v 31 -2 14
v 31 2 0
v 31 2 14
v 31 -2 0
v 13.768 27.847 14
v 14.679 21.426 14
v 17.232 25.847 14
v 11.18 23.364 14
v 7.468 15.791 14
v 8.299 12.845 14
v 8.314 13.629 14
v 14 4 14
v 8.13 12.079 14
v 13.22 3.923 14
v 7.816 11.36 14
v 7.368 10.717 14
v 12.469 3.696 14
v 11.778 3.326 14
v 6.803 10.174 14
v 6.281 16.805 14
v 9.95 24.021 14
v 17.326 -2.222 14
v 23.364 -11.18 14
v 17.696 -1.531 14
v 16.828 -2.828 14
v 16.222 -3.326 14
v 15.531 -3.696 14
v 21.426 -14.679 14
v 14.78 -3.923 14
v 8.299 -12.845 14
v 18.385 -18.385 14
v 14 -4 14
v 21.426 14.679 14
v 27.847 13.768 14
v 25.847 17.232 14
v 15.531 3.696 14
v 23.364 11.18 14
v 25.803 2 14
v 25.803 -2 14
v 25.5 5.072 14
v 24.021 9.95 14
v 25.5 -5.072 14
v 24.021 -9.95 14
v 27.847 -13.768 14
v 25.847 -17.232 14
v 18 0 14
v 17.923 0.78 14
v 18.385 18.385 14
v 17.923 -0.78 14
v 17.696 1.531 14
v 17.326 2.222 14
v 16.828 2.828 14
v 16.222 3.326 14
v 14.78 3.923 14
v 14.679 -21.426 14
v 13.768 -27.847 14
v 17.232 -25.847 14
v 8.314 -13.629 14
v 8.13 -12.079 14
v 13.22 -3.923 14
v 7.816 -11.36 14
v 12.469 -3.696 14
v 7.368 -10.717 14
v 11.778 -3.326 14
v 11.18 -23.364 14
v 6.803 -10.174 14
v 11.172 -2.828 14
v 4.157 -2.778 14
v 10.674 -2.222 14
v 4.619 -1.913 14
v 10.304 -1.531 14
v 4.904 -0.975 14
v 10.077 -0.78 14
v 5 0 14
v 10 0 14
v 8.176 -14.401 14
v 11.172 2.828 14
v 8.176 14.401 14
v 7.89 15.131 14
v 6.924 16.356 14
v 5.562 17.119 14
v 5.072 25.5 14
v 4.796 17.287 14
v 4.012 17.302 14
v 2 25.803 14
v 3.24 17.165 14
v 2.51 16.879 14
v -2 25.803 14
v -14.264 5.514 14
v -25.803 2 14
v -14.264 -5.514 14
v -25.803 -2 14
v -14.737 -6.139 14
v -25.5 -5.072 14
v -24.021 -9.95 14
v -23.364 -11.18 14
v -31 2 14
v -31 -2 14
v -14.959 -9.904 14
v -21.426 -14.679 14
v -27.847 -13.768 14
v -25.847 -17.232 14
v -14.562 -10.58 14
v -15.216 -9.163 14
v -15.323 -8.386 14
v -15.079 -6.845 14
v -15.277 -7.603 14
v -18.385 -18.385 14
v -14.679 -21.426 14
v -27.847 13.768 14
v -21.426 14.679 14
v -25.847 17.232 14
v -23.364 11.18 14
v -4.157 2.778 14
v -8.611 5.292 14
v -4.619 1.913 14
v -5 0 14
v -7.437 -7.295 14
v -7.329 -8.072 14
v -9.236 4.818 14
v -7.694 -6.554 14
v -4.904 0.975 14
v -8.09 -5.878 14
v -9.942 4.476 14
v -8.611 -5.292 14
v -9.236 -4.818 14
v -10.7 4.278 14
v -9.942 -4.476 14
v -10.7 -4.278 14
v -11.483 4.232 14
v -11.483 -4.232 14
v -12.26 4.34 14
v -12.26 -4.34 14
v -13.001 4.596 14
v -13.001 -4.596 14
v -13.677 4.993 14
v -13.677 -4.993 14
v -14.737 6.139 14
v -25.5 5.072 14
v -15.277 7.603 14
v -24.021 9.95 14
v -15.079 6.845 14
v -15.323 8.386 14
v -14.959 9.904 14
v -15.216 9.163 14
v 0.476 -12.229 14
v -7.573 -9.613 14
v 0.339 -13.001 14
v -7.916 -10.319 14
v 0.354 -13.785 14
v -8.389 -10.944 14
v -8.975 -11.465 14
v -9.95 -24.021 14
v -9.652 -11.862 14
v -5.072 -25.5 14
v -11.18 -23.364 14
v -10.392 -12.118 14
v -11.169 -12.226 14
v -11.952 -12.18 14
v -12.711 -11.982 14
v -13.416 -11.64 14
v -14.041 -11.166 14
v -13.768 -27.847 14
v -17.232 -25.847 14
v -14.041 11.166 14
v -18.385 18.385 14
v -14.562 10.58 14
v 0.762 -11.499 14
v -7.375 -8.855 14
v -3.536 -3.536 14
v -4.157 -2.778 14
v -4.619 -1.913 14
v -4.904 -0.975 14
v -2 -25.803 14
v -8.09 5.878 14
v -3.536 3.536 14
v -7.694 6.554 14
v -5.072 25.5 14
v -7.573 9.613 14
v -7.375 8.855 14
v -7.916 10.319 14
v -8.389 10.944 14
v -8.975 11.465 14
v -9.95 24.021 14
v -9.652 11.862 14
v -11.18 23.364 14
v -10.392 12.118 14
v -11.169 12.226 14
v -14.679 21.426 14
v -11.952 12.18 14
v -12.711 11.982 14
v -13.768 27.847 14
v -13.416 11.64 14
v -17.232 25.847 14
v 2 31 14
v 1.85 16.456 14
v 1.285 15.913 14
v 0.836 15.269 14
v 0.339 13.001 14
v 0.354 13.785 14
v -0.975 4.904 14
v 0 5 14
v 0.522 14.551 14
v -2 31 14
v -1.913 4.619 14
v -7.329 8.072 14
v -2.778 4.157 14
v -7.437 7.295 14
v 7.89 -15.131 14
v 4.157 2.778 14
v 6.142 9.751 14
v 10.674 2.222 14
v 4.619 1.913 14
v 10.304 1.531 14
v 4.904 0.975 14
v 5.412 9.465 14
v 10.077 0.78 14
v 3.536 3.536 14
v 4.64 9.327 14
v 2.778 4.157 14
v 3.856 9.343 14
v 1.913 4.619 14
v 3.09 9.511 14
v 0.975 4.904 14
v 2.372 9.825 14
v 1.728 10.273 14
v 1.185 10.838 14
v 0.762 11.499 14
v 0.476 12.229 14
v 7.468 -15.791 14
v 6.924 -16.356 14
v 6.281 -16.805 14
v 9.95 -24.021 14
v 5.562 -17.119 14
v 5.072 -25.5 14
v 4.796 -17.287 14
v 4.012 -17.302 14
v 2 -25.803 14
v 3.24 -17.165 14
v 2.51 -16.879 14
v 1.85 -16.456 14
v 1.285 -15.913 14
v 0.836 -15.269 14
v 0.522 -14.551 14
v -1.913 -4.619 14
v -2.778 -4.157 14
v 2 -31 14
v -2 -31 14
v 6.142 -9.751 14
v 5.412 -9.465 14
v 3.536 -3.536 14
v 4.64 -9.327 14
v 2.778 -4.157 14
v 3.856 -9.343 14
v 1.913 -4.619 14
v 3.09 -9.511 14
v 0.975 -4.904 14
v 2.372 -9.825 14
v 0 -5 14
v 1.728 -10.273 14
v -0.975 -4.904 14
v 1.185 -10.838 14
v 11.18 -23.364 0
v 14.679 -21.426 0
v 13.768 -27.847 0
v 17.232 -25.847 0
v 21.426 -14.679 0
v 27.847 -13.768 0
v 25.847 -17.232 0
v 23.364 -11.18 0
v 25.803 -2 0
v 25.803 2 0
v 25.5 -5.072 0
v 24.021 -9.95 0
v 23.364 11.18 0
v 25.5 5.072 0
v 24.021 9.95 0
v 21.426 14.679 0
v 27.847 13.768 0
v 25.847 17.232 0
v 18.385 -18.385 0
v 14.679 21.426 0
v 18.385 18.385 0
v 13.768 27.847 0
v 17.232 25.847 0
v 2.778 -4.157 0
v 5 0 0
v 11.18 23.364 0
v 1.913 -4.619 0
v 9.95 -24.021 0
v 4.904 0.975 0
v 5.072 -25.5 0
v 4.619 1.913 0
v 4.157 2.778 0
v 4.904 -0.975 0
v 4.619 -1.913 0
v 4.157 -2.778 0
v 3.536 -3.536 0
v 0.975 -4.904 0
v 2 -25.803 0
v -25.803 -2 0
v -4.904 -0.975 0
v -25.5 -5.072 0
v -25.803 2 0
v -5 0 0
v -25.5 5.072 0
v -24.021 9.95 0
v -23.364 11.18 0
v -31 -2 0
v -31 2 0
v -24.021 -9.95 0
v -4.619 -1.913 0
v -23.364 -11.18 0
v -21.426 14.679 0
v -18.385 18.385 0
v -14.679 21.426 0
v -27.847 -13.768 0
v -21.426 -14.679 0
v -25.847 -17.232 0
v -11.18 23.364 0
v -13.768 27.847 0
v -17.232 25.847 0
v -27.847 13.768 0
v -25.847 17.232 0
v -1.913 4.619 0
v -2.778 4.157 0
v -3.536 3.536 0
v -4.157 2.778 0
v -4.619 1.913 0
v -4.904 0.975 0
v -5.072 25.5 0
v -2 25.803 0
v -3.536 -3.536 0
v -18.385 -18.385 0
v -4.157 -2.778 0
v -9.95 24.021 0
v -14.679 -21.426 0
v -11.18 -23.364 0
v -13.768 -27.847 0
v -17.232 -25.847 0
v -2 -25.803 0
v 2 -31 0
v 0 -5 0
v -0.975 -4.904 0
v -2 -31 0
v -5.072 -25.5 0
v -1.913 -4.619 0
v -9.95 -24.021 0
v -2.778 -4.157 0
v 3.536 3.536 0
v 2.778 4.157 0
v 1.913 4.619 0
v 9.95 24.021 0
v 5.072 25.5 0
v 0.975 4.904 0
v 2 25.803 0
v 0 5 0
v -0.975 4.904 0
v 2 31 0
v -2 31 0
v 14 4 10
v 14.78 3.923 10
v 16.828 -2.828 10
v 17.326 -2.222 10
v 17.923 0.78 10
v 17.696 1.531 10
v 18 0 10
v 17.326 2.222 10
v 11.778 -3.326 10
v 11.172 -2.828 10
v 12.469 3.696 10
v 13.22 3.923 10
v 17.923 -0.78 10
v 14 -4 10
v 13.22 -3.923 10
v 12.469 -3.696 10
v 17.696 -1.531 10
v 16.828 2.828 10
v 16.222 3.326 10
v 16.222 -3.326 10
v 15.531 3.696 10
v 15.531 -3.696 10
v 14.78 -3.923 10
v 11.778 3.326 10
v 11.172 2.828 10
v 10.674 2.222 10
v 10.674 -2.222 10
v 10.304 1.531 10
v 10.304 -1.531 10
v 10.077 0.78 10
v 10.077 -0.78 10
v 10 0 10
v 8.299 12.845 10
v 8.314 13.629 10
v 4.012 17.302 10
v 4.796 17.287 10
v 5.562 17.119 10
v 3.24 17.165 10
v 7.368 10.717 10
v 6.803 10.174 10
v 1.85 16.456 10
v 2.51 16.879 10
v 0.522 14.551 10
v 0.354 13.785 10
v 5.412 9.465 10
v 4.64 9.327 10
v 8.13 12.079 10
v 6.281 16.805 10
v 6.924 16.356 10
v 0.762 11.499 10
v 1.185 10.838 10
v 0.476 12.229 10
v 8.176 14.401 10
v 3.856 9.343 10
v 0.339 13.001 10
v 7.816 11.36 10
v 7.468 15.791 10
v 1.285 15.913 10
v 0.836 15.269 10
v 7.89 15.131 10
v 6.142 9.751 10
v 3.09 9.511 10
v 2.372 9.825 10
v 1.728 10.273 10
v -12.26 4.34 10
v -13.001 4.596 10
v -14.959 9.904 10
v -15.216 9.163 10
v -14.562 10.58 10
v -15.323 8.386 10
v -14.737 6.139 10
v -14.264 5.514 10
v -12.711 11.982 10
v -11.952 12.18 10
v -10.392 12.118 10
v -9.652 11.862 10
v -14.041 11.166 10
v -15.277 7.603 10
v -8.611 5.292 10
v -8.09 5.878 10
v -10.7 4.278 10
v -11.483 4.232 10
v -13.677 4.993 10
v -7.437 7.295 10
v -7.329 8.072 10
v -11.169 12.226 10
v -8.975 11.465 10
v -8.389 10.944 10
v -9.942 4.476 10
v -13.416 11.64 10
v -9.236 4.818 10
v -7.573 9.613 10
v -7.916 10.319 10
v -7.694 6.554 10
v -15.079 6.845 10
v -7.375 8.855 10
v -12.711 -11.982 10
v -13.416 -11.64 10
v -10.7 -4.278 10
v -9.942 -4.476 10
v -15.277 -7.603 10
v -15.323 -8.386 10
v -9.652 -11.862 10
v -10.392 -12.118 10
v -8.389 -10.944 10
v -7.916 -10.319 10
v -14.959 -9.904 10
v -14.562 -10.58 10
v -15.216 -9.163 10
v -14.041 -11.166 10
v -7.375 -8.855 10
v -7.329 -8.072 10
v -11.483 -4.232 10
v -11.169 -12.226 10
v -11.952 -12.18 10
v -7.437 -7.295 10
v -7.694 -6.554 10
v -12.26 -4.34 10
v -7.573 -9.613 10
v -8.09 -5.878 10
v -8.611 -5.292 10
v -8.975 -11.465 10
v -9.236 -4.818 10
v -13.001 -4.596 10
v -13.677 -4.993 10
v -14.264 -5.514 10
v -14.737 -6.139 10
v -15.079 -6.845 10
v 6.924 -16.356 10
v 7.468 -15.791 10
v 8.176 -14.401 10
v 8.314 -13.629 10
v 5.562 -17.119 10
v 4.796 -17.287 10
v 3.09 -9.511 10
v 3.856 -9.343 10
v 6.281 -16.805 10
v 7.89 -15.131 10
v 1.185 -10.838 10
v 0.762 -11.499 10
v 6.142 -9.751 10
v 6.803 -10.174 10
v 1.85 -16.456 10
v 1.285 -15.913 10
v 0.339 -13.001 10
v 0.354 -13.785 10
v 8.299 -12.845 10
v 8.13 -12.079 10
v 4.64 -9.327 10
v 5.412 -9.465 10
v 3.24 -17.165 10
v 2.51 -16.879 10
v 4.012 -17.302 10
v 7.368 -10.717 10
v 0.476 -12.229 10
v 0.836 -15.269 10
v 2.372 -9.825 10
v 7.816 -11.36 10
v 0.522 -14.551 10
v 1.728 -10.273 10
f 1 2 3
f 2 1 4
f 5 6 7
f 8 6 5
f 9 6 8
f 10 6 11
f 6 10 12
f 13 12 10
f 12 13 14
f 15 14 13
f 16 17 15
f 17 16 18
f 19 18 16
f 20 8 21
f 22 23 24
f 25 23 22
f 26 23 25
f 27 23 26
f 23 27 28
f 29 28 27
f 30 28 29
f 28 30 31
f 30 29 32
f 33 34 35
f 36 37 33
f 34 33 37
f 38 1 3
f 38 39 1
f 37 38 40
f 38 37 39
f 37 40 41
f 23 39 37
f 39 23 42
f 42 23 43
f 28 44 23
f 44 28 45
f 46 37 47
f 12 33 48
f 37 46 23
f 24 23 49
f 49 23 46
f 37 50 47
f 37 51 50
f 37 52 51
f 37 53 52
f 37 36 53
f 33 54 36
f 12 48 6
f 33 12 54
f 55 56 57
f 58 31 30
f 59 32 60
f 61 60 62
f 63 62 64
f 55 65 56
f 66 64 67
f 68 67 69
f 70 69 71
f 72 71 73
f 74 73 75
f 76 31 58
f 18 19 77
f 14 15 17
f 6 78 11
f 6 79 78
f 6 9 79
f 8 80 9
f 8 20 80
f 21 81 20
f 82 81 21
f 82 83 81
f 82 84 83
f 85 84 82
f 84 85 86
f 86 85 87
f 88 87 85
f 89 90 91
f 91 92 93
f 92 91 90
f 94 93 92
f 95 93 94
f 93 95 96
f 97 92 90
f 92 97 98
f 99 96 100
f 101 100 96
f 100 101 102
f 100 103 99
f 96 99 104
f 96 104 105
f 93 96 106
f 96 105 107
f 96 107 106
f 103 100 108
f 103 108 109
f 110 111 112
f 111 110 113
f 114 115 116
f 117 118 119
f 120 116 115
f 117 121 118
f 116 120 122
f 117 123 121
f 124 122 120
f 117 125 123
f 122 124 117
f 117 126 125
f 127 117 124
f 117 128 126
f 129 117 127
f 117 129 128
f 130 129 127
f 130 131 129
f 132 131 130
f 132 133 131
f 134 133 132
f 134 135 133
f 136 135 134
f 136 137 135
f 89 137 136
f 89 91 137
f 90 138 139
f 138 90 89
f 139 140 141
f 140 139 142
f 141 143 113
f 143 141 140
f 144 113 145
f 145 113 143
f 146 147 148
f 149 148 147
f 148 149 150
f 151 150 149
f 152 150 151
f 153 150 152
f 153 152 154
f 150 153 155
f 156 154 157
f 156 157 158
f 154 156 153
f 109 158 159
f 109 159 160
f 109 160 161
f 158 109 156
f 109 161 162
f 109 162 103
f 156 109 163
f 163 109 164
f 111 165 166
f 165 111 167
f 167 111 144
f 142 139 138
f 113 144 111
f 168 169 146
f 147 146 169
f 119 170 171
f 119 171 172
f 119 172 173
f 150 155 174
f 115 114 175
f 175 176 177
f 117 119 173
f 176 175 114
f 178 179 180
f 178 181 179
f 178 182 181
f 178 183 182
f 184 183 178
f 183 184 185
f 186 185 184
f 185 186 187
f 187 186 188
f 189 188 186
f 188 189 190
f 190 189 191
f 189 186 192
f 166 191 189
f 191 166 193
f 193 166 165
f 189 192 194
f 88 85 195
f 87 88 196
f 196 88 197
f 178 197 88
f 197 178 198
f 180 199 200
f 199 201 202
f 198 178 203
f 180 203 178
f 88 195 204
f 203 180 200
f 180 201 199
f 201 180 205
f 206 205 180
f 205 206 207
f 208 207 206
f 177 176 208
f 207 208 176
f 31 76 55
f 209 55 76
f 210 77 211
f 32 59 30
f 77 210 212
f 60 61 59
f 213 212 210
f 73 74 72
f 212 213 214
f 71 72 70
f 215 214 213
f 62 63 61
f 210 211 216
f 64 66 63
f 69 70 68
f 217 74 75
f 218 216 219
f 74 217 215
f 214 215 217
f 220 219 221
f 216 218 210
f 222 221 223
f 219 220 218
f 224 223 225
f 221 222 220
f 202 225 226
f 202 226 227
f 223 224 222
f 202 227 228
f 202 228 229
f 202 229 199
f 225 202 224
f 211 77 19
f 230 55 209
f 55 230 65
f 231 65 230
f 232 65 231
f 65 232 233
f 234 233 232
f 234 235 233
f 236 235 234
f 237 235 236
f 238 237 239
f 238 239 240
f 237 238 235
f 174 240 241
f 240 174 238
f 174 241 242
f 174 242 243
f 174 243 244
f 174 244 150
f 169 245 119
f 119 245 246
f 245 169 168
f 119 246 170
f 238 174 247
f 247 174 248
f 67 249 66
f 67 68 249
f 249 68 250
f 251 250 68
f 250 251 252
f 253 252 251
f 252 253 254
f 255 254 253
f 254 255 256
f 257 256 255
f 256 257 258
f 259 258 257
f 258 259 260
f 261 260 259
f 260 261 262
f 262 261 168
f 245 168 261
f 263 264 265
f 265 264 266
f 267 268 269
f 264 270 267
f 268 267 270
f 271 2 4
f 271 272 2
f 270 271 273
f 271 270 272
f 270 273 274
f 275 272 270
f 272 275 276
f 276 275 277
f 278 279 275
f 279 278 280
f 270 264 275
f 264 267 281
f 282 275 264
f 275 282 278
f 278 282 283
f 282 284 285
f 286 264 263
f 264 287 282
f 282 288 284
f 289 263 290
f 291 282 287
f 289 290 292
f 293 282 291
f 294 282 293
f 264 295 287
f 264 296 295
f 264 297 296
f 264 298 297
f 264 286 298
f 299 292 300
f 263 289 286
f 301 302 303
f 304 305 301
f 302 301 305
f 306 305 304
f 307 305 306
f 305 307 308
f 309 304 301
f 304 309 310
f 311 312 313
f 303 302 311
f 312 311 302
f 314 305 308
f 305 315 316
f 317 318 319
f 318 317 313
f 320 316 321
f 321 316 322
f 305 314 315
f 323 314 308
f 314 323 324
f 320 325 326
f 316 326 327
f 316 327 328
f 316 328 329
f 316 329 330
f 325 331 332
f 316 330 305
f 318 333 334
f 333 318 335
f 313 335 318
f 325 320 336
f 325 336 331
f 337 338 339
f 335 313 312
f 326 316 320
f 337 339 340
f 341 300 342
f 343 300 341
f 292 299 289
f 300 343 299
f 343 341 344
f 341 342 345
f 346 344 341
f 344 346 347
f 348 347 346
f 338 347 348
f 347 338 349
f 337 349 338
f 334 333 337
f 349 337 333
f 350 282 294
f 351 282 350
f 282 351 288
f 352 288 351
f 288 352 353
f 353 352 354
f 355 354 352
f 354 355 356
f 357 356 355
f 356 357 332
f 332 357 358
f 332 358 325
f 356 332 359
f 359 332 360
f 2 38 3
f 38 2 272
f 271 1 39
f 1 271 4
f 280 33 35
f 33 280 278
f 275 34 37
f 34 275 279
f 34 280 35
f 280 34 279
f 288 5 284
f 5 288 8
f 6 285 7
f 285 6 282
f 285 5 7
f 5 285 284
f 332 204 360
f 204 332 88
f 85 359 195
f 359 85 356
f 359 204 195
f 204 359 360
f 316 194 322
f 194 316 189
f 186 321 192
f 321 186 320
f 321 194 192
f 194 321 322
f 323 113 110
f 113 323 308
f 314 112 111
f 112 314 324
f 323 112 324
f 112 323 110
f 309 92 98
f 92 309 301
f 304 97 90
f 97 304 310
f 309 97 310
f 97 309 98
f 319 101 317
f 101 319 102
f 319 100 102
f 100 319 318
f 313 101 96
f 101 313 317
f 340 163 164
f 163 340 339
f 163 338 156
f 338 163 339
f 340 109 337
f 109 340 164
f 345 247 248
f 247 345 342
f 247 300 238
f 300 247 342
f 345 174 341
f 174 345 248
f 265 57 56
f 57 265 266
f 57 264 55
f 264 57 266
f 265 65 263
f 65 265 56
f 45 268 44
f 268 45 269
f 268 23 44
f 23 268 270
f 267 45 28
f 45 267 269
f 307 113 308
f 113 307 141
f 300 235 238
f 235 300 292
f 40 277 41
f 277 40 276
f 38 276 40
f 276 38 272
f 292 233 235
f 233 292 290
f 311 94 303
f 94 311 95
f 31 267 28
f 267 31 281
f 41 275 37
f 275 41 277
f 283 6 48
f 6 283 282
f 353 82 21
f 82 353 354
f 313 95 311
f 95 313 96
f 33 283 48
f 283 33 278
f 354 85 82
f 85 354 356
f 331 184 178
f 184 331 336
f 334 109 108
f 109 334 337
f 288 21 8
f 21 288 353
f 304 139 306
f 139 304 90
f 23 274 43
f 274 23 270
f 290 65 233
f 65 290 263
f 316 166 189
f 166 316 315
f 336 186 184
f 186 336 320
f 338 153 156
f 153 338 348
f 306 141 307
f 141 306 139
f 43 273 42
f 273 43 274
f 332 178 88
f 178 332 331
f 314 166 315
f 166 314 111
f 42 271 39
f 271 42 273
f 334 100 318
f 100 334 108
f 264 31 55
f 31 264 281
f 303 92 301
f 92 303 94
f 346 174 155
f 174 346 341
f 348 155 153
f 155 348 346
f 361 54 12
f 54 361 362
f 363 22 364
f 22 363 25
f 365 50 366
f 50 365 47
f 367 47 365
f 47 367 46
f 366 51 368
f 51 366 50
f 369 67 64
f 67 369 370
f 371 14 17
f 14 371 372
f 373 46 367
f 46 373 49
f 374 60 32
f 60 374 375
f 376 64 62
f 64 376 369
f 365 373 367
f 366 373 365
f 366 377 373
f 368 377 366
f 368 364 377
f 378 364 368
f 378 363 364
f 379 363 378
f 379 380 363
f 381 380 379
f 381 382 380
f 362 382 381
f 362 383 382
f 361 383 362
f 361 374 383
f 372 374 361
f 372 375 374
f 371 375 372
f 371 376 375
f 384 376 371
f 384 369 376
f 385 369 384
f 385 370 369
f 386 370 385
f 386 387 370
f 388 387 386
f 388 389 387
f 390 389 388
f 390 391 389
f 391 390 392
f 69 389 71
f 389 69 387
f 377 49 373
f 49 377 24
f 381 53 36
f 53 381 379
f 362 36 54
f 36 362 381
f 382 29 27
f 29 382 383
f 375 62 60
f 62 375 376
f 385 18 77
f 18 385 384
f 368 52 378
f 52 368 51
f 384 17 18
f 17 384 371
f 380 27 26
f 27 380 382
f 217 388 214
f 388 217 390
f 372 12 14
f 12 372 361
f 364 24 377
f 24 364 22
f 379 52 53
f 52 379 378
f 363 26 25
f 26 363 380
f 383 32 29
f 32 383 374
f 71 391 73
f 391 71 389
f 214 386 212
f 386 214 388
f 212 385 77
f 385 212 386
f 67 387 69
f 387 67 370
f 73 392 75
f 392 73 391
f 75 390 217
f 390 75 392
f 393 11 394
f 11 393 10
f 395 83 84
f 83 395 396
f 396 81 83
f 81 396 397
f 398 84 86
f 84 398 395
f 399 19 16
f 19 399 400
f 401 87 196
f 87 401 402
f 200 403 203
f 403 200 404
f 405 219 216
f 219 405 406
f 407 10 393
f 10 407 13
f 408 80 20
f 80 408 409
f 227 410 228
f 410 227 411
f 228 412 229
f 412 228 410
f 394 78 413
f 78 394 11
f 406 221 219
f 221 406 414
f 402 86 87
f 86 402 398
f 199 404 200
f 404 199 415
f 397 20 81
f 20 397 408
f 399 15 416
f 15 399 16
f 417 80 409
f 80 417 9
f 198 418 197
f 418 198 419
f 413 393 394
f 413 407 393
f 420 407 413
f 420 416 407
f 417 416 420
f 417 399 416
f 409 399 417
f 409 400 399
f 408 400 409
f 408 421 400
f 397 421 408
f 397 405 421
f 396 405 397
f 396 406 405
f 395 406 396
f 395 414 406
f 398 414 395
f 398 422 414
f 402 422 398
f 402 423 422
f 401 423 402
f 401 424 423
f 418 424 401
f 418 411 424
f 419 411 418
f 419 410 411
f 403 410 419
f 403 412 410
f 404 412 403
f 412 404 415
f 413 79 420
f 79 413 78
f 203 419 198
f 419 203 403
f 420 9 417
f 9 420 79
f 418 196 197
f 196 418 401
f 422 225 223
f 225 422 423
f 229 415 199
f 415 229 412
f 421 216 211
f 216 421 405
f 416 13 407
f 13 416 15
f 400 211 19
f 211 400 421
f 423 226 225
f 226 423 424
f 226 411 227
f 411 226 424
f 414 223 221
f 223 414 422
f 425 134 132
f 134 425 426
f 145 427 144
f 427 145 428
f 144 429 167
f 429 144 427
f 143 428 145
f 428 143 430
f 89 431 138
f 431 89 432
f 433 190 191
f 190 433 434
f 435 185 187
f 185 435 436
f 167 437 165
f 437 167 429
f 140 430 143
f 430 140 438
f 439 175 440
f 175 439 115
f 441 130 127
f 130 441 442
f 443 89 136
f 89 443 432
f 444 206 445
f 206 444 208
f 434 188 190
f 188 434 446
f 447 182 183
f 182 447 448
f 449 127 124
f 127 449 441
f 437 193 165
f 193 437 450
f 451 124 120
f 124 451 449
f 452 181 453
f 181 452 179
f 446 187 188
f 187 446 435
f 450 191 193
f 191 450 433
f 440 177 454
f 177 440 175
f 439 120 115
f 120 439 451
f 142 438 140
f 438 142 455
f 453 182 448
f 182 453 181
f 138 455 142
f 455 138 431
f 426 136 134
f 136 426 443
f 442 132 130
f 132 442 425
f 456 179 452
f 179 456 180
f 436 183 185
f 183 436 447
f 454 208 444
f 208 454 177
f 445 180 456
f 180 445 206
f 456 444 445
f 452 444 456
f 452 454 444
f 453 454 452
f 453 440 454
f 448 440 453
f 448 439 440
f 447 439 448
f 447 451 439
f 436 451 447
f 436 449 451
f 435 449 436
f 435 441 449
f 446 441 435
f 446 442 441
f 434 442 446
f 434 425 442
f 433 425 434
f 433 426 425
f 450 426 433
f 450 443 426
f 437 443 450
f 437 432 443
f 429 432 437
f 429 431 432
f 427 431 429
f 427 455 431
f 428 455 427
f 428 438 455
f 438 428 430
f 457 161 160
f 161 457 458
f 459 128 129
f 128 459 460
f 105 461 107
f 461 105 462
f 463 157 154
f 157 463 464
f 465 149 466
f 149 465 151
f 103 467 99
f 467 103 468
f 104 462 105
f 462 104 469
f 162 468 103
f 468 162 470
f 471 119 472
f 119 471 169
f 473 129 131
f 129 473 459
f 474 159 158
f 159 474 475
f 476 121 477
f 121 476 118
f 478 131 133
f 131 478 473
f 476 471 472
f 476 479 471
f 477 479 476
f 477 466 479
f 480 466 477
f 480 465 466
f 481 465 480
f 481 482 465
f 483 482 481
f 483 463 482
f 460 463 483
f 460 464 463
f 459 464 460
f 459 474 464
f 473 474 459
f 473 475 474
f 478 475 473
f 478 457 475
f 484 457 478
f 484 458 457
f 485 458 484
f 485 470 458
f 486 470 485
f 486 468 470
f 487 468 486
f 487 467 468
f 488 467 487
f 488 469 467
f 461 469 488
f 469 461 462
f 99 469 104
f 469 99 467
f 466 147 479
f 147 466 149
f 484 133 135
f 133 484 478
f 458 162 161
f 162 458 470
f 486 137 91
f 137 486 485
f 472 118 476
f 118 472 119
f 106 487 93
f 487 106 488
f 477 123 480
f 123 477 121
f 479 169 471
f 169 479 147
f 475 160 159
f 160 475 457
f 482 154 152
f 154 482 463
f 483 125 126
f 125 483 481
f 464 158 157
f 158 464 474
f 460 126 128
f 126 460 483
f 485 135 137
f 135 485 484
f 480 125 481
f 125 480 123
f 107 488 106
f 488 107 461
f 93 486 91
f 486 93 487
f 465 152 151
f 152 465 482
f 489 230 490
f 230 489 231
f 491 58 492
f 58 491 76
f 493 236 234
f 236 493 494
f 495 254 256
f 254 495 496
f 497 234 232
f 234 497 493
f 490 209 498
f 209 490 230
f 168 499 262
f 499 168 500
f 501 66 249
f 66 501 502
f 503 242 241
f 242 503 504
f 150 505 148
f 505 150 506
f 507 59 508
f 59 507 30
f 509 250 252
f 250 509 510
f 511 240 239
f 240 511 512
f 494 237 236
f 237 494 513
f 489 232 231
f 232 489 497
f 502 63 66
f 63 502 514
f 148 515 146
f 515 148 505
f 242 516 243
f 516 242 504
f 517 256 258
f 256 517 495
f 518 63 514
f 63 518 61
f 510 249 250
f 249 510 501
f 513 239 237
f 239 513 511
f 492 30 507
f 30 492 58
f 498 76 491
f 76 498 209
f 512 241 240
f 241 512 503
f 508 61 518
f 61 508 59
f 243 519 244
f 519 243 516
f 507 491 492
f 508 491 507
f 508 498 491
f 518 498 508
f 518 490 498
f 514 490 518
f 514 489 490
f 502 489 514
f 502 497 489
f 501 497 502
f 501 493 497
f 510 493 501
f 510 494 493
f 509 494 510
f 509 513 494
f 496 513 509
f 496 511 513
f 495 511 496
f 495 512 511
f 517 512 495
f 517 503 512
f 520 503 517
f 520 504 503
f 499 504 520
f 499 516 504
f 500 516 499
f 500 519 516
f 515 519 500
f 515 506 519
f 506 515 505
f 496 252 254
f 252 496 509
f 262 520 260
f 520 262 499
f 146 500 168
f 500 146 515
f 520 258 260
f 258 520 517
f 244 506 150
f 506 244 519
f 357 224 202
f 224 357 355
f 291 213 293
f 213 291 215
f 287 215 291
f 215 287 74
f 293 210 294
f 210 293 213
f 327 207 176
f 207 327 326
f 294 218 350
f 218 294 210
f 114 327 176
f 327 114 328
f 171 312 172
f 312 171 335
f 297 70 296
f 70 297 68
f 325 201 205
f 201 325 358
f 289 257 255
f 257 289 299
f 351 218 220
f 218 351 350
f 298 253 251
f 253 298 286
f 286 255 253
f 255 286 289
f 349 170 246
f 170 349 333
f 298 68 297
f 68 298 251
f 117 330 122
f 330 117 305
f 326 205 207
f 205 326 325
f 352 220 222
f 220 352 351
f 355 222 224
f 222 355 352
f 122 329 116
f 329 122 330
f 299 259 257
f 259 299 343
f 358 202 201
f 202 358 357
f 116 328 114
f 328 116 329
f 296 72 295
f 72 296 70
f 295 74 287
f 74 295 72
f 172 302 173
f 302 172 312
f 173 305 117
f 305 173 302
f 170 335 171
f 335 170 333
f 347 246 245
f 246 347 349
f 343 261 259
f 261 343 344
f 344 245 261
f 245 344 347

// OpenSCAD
$fn = 32;

// ----------------------------------------------------------------------
// Spur blank: lightened gear blank
// ----------------------------------------------------------------------

// --- parameters (mm) ---
disc_r = 26;              // blank root radius
disc_t = 14;              // blank thickness
n_teeth = 12;             // stub tooth count
tooth_w = 4;              // tooth width at the root
tooth_h = 5;              // tooth height above the root
bore_r = 5;               // central bore radius
ring_r = 14;              // lightening pocket ring radius
pocket_r = 4;             // lightening pocket radius

out_r = disc_r + tooth_h;  // tip radius
bbox_x = 62.0;  // measured width over the teeth
bbox_y = 62.0;  // measured depth over the teeth

difference() {
union() {
  cylinder(r = disc_r, h = disc_t);
  for (i = [0 : n_teeth - 1])
    rotate([0, 0, i * 360 / n_teeth])
      translate([disc_r - 1, -tooth_w / 2, 0])
        cube([tooth_h + 1, tooth_w, disc_t]);
}
  translate([0, 0, -1]) cylinder(r = bore_r, h = disc_t + 2);
  for (i = [0 : 5])
    rotate([0, 0, i * 72])
      translate([ring_r, 0, disc_t - 4])
        cylinder(r = pocket_r, h = 5);
}
